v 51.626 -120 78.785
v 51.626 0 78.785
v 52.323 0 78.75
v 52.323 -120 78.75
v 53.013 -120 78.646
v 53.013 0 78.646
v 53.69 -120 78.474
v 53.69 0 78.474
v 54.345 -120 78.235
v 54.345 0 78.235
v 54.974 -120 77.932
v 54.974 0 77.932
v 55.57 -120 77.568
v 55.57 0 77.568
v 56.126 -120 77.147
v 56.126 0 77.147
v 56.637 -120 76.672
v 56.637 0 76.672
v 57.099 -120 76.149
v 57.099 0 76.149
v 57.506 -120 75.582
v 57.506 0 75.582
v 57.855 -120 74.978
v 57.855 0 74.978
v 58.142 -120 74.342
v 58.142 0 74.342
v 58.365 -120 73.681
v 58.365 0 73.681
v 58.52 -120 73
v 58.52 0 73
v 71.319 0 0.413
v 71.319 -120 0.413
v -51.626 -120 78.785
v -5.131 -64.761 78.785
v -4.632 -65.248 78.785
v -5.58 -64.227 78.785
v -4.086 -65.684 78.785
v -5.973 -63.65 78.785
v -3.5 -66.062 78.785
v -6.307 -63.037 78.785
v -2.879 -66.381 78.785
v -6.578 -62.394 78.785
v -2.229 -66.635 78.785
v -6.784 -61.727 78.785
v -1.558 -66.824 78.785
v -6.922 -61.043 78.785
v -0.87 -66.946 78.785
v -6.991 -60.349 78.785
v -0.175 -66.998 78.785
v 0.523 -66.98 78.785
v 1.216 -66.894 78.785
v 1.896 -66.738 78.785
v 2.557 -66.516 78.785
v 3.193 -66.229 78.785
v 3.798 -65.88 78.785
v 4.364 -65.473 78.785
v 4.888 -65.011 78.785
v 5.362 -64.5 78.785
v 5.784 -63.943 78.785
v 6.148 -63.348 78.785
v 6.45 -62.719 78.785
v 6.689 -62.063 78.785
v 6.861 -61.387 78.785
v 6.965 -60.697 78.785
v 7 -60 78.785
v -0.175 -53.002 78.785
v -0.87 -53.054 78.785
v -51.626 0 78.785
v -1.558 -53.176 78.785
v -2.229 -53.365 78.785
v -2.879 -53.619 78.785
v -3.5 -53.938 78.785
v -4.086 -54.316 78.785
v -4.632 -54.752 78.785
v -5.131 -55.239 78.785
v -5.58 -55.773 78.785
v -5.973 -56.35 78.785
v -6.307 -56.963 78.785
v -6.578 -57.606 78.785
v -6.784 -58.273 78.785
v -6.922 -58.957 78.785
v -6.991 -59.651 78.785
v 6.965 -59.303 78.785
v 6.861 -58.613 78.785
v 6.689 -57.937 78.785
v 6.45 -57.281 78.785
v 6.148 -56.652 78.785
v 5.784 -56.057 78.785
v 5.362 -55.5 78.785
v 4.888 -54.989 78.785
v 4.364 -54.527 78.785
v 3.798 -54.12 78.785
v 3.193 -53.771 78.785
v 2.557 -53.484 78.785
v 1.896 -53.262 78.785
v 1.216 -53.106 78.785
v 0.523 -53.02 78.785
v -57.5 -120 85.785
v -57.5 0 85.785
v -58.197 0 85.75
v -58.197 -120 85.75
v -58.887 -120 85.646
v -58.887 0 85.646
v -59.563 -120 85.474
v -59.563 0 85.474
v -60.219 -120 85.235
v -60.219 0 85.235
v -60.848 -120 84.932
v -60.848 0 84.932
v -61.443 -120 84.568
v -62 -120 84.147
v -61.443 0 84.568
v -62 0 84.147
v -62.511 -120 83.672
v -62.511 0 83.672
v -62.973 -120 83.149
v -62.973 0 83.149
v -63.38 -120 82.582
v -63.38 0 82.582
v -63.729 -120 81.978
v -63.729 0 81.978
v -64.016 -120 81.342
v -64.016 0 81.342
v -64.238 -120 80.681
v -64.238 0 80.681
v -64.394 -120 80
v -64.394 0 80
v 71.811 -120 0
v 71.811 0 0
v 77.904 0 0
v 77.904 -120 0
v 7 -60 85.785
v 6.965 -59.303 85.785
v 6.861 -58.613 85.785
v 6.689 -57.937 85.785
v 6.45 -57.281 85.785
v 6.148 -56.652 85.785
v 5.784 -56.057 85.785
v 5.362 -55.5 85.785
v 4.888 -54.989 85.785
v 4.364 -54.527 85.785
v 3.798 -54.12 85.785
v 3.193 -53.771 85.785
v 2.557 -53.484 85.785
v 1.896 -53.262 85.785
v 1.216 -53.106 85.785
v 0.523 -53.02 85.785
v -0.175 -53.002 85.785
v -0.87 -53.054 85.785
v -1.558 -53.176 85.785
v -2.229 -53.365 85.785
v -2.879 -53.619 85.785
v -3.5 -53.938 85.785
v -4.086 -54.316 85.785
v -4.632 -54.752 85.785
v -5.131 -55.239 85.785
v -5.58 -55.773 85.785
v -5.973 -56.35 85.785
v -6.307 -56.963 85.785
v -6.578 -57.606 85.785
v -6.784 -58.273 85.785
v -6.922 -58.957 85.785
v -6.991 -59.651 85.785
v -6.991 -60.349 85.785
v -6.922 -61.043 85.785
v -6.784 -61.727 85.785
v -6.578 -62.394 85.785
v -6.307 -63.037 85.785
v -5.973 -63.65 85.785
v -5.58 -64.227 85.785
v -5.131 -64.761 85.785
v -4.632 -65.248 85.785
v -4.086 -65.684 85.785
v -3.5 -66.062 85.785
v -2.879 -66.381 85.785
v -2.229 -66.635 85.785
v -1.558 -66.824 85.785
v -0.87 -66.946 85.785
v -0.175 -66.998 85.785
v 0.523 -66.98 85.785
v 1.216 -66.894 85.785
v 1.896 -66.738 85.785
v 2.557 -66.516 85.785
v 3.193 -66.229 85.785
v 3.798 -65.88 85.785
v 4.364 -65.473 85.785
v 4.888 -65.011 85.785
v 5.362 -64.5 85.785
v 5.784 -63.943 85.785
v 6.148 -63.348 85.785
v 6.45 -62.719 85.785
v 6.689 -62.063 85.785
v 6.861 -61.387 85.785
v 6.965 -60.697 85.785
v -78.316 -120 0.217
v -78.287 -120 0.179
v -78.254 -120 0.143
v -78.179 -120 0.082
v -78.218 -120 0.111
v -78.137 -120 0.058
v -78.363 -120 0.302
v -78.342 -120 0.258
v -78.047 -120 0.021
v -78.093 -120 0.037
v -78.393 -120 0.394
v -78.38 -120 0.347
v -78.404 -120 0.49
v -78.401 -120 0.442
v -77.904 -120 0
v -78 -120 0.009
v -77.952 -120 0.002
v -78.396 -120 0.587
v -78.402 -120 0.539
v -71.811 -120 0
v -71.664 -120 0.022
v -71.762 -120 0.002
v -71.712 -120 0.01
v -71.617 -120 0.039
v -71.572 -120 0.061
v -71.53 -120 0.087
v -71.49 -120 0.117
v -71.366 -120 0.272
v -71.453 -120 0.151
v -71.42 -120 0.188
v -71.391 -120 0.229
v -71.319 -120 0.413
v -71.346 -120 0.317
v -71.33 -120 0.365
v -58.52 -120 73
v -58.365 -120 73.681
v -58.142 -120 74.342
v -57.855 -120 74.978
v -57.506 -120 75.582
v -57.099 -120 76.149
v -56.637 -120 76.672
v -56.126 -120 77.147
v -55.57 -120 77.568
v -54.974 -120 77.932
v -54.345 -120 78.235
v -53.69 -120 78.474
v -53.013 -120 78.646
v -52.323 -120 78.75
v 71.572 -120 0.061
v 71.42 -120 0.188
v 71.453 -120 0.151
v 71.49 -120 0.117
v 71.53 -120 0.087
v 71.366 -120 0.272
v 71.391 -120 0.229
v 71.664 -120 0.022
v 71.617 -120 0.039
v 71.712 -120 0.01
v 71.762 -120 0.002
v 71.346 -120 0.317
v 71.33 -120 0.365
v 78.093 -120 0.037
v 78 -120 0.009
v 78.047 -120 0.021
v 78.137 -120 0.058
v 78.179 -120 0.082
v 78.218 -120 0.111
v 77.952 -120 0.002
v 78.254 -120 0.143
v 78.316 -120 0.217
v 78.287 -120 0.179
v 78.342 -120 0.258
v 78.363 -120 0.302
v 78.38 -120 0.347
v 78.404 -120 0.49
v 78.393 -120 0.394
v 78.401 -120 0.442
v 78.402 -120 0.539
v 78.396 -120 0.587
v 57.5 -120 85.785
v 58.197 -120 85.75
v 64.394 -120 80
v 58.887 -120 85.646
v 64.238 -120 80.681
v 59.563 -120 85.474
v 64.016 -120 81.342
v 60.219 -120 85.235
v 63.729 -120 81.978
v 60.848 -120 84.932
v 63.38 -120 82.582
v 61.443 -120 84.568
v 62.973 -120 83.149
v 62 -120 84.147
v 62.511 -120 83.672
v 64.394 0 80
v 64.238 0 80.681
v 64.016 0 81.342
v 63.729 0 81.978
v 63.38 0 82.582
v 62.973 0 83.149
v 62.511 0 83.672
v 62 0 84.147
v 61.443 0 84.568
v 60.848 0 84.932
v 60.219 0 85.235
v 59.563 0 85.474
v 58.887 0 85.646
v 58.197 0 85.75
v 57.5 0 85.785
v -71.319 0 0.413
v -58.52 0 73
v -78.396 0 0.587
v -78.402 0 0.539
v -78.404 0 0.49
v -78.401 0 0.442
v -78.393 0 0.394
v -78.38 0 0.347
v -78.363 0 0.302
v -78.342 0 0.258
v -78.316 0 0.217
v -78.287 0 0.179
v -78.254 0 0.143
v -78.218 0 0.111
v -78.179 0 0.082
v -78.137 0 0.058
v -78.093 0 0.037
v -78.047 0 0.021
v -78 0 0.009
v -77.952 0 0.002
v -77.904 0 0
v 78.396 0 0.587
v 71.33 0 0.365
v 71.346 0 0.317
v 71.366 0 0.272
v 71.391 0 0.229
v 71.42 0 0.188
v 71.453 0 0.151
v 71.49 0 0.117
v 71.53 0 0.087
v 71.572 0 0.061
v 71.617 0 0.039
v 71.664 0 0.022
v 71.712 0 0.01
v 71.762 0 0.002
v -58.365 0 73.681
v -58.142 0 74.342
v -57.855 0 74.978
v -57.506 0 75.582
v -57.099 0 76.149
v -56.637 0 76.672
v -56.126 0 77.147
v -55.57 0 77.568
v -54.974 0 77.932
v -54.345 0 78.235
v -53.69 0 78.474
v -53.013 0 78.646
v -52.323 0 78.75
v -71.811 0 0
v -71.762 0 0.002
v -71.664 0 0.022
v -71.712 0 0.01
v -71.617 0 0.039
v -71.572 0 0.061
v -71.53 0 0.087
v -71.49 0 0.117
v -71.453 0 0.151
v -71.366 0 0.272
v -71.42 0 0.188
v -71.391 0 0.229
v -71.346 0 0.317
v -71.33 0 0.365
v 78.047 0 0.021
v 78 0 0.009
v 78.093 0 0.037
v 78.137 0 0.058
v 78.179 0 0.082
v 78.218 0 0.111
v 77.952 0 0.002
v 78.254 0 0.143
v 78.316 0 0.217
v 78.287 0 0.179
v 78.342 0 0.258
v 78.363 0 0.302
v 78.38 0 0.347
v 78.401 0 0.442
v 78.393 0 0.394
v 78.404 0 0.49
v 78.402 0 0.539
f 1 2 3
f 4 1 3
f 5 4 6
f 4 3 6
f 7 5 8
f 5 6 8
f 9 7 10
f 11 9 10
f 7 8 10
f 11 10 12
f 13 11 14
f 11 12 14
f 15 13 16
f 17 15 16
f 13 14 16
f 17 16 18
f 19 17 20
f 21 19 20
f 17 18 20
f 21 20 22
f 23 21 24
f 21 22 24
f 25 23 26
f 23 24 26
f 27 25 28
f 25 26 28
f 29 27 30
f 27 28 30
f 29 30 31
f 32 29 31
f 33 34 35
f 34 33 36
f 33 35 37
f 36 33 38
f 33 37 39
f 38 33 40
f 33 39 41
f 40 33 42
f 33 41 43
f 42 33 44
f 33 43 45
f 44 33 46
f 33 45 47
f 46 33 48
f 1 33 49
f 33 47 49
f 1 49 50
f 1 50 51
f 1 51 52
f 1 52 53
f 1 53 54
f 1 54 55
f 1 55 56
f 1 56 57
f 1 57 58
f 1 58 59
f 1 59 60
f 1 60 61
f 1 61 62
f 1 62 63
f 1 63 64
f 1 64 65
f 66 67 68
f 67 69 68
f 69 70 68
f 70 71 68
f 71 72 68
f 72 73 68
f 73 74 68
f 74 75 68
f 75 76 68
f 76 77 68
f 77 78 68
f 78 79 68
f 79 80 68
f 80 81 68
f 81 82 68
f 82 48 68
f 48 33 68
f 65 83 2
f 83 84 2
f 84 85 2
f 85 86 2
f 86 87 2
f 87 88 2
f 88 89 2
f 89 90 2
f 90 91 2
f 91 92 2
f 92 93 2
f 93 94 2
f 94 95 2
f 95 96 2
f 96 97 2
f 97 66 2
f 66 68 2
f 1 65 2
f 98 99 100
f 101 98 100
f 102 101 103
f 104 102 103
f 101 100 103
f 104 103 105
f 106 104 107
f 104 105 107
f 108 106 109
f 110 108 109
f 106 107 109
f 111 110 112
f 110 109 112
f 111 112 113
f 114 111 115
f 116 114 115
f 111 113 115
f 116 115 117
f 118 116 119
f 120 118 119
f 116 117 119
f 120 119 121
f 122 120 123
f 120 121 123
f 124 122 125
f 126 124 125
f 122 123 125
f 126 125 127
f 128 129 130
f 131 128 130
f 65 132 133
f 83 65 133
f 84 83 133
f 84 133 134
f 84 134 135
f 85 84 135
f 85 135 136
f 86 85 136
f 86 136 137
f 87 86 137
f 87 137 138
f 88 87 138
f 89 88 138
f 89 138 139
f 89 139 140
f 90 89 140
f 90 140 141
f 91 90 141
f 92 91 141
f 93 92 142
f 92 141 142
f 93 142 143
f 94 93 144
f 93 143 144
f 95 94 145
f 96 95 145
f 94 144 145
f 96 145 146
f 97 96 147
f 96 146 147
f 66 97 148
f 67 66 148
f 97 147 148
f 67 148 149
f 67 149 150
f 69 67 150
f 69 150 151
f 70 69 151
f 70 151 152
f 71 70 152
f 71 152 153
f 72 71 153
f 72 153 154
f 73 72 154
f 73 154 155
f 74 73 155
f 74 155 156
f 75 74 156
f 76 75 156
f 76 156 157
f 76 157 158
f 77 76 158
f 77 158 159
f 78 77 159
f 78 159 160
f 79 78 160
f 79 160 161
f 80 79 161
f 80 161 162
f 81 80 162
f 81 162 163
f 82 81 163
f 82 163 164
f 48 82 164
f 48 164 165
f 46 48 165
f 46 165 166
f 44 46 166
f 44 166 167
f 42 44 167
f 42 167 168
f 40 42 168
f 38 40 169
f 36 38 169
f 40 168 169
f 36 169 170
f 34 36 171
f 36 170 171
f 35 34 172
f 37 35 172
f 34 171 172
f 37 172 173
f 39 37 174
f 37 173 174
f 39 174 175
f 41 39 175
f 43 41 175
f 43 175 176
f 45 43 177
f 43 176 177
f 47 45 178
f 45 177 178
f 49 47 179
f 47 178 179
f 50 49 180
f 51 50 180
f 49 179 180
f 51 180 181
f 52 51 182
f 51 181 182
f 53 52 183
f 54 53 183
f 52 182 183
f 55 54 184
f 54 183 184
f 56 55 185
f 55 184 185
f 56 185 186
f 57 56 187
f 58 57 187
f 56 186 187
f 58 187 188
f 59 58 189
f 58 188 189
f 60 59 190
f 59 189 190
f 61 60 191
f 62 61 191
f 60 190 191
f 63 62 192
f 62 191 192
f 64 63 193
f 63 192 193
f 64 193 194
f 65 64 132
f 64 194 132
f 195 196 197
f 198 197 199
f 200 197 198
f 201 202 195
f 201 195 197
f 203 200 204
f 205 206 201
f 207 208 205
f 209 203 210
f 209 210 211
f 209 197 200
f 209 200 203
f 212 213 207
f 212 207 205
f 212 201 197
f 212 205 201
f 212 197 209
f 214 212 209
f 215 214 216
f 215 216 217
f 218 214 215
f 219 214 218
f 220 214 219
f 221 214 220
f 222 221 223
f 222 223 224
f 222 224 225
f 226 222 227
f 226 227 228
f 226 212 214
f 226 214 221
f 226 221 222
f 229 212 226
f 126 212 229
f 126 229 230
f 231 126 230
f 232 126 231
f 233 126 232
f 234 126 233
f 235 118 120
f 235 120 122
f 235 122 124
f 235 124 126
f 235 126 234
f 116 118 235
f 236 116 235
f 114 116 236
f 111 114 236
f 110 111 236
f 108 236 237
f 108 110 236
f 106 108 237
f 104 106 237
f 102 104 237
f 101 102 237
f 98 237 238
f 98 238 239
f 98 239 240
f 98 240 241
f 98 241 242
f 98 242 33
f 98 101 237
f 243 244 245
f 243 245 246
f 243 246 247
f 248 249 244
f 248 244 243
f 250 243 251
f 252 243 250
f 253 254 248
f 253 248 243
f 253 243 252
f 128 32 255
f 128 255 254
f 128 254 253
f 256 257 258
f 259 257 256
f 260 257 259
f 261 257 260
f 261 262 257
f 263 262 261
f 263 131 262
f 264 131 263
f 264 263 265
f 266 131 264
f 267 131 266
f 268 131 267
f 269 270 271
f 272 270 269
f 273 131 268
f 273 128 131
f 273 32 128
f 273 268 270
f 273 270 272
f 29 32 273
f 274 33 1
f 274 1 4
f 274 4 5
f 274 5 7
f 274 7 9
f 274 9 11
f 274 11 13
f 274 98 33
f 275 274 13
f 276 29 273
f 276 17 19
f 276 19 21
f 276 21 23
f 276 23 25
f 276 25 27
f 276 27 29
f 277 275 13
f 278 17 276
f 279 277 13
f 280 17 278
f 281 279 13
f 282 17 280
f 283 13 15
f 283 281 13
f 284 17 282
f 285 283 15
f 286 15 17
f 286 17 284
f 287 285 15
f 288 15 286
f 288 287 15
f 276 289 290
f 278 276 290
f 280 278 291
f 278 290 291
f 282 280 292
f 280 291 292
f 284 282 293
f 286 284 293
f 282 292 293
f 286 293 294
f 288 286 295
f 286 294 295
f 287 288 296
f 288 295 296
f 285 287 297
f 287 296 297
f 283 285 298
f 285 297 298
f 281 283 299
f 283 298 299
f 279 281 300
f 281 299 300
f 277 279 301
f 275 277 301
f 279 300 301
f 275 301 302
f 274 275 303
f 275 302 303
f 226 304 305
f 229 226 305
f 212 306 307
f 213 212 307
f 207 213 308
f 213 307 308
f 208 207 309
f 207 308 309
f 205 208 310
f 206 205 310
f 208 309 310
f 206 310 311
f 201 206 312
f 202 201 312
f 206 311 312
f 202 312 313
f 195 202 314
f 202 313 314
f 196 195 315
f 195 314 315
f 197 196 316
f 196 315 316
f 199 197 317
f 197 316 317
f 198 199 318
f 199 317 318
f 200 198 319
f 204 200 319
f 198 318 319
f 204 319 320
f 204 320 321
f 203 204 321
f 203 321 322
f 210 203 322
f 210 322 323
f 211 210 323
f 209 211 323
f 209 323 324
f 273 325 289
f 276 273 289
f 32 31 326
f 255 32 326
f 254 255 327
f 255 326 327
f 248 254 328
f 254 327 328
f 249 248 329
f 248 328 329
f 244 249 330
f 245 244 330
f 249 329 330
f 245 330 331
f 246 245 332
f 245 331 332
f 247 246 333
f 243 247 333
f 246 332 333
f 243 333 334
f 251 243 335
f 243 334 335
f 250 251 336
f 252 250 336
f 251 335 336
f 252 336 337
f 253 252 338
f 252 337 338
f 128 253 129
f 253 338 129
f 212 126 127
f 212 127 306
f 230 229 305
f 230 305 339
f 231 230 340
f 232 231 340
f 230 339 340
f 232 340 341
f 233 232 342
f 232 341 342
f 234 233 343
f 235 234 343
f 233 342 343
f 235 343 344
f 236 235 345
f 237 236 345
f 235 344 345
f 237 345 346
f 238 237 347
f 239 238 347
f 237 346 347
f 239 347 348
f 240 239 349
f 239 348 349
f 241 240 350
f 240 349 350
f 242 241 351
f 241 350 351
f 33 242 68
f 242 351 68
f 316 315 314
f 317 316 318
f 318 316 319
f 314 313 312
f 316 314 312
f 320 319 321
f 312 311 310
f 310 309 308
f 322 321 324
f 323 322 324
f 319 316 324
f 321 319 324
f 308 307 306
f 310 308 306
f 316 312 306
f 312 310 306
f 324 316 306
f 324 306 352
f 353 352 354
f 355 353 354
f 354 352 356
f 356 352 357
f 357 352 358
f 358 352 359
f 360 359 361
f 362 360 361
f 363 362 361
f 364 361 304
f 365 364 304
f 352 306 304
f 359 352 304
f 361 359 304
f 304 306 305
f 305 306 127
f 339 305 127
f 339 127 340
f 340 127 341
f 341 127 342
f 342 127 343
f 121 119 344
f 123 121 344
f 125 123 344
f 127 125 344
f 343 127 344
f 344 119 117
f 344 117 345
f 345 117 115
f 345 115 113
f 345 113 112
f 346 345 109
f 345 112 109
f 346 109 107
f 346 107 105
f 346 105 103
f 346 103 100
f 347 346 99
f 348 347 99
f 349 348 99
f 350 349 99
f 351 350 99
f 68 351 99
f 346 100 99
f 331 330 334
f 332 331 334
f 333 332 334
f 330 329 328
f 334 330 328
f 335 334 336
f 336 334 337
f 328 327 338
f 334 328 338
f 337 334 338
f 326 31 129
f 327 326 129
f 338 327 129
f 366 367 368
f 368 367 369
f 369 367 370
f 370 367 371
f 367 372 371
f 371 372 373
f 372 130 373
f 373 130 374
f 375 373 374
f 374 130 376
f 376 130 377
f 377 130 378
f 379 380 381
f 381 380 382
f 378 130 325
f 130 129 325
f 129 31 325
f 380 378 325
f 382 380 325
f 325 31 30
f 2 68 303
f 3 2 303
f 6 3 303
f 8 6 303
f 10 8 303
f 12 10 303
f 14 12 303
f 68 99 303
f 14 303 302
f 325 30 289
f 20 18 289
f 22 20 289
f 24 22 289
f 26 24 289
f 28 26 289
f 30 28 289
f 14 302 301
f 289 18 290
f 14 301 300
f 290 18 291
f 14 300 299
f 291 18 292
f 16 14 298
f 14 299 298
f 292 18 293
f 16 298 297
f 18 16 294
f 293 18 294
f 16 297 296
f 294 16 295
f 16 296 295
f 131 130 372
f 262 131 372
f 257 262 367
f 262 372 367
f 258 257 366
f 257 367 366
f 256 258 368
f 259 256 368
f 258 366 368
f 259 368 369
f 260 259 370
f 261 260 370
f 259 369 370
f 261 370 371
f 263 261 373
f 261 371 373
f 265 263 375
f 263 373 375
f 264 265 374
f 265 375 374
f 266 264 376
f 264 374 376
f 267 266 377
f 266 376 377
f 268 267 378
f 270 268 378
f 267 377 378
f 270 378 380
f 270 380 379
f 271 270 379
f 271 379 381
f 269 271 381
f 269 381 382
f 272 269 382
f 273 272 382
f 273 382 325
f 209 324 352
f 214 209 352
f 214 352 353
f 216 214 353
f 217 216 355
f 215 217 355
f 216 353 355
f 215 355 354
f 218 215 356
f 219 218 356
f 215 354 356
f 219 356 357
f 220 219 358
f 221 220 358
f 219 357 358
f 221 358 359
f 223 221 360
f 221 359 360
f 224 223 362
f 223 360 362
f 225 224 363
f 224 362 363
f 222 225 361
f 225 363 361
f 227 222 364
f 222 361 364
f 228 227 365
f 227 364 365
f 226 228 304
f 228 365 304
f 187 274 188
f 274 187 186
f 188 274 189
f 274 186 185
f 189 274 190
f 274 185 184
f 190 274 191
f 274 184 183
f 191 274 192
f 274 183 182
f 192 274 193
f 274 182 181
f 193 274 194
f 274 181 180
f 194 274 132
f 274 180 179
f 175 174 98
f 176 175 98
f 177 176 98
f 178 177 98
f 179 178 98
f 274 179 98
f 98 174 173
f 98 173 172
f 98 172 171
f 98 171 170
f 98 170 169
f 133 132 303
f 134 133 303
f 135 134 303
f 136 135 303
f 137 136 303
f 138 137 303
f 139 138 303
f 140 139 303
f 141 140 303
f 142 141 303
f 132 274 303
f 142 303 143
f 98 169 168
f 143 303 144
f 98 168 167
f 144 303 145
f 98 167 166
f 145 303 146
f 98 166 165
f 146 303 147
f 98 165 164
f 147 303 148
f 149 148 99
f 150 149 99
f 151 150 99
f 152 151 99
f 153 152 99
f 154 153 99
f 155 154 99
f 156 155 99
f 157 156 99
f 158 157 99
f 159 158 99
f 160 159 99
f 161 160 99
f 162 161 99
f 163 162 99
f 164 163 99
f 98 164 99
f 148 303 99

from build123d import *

# Parameters (mm, degrees)
F1_DEPTH = 120
F2_R     = 7
F3_DEPTH = 25


with BuildPart() as f1:
    # F0 (on Front) → F1 (new body)
    with BuildSketch(Plane.XZ):
        with BuildLine():
            ThreePointArc((-71.811404, 0), (-71.49001, 0.116978), (-71.319, 0.413176))
            Line((-71.319, 0.413176), (-58.519957, 73.000157))
            ThreePointArc((-58.519957, 73.000157), (-56.125816, 77.146931), (-51.626303, 78.78462))
            Line((-51.626303, 78.78462), (51.626303, 78.78462))
            ThreePointArc((51.626303, 78.78462), (56.125816, 77.146931), (58.519957, 73.000157))
            Line((58.519957, 73.000157), (71.319, 0.413176))
            ThreePointArc((71.319, 0.413176), (71.49001, 0.116978), (71.811404, 0))
            Line((71.811404, 0), (77.903964, 0))
            ThreePointArc((77.903964, 0), (78.286986, 0.178606), (78.396368, 0.586824))
            Line((78.396368, 0.586824), (64.393654, 80.000157))
            ThreePointArc((64.393654, 80.000157), (61.999513, 84.146931), (57.5, 85.78462))
            Line((57.5, 85.78462), (-57.5, 85.78462))
            ThreePointArc((-57.5, 85.78462), (-61.999513, 84.146931), (-64.393654, 80.000157))
            Line((-64.393654, 80.000157), (-78.396368, 0.586824))
            ThreePointArc((-78.396368, 0.586824), (-78.286986, 0.178606), (-77.903964, 0))
            Line((-77.903964, 0), (-71.811404, 0))
        make_face()
    extrude(amount=F1_DEPTH)

    # F2 (on face) → F3 (cut)
    with BuildSketch(Plane.XY.offset(85.78462)):
        with Locations((0, -60)):
            Circle(F2_R)
    extrude(amount=-F3_DEPTH, mode=Mode.SUBTRACT)


solid = f1.part
